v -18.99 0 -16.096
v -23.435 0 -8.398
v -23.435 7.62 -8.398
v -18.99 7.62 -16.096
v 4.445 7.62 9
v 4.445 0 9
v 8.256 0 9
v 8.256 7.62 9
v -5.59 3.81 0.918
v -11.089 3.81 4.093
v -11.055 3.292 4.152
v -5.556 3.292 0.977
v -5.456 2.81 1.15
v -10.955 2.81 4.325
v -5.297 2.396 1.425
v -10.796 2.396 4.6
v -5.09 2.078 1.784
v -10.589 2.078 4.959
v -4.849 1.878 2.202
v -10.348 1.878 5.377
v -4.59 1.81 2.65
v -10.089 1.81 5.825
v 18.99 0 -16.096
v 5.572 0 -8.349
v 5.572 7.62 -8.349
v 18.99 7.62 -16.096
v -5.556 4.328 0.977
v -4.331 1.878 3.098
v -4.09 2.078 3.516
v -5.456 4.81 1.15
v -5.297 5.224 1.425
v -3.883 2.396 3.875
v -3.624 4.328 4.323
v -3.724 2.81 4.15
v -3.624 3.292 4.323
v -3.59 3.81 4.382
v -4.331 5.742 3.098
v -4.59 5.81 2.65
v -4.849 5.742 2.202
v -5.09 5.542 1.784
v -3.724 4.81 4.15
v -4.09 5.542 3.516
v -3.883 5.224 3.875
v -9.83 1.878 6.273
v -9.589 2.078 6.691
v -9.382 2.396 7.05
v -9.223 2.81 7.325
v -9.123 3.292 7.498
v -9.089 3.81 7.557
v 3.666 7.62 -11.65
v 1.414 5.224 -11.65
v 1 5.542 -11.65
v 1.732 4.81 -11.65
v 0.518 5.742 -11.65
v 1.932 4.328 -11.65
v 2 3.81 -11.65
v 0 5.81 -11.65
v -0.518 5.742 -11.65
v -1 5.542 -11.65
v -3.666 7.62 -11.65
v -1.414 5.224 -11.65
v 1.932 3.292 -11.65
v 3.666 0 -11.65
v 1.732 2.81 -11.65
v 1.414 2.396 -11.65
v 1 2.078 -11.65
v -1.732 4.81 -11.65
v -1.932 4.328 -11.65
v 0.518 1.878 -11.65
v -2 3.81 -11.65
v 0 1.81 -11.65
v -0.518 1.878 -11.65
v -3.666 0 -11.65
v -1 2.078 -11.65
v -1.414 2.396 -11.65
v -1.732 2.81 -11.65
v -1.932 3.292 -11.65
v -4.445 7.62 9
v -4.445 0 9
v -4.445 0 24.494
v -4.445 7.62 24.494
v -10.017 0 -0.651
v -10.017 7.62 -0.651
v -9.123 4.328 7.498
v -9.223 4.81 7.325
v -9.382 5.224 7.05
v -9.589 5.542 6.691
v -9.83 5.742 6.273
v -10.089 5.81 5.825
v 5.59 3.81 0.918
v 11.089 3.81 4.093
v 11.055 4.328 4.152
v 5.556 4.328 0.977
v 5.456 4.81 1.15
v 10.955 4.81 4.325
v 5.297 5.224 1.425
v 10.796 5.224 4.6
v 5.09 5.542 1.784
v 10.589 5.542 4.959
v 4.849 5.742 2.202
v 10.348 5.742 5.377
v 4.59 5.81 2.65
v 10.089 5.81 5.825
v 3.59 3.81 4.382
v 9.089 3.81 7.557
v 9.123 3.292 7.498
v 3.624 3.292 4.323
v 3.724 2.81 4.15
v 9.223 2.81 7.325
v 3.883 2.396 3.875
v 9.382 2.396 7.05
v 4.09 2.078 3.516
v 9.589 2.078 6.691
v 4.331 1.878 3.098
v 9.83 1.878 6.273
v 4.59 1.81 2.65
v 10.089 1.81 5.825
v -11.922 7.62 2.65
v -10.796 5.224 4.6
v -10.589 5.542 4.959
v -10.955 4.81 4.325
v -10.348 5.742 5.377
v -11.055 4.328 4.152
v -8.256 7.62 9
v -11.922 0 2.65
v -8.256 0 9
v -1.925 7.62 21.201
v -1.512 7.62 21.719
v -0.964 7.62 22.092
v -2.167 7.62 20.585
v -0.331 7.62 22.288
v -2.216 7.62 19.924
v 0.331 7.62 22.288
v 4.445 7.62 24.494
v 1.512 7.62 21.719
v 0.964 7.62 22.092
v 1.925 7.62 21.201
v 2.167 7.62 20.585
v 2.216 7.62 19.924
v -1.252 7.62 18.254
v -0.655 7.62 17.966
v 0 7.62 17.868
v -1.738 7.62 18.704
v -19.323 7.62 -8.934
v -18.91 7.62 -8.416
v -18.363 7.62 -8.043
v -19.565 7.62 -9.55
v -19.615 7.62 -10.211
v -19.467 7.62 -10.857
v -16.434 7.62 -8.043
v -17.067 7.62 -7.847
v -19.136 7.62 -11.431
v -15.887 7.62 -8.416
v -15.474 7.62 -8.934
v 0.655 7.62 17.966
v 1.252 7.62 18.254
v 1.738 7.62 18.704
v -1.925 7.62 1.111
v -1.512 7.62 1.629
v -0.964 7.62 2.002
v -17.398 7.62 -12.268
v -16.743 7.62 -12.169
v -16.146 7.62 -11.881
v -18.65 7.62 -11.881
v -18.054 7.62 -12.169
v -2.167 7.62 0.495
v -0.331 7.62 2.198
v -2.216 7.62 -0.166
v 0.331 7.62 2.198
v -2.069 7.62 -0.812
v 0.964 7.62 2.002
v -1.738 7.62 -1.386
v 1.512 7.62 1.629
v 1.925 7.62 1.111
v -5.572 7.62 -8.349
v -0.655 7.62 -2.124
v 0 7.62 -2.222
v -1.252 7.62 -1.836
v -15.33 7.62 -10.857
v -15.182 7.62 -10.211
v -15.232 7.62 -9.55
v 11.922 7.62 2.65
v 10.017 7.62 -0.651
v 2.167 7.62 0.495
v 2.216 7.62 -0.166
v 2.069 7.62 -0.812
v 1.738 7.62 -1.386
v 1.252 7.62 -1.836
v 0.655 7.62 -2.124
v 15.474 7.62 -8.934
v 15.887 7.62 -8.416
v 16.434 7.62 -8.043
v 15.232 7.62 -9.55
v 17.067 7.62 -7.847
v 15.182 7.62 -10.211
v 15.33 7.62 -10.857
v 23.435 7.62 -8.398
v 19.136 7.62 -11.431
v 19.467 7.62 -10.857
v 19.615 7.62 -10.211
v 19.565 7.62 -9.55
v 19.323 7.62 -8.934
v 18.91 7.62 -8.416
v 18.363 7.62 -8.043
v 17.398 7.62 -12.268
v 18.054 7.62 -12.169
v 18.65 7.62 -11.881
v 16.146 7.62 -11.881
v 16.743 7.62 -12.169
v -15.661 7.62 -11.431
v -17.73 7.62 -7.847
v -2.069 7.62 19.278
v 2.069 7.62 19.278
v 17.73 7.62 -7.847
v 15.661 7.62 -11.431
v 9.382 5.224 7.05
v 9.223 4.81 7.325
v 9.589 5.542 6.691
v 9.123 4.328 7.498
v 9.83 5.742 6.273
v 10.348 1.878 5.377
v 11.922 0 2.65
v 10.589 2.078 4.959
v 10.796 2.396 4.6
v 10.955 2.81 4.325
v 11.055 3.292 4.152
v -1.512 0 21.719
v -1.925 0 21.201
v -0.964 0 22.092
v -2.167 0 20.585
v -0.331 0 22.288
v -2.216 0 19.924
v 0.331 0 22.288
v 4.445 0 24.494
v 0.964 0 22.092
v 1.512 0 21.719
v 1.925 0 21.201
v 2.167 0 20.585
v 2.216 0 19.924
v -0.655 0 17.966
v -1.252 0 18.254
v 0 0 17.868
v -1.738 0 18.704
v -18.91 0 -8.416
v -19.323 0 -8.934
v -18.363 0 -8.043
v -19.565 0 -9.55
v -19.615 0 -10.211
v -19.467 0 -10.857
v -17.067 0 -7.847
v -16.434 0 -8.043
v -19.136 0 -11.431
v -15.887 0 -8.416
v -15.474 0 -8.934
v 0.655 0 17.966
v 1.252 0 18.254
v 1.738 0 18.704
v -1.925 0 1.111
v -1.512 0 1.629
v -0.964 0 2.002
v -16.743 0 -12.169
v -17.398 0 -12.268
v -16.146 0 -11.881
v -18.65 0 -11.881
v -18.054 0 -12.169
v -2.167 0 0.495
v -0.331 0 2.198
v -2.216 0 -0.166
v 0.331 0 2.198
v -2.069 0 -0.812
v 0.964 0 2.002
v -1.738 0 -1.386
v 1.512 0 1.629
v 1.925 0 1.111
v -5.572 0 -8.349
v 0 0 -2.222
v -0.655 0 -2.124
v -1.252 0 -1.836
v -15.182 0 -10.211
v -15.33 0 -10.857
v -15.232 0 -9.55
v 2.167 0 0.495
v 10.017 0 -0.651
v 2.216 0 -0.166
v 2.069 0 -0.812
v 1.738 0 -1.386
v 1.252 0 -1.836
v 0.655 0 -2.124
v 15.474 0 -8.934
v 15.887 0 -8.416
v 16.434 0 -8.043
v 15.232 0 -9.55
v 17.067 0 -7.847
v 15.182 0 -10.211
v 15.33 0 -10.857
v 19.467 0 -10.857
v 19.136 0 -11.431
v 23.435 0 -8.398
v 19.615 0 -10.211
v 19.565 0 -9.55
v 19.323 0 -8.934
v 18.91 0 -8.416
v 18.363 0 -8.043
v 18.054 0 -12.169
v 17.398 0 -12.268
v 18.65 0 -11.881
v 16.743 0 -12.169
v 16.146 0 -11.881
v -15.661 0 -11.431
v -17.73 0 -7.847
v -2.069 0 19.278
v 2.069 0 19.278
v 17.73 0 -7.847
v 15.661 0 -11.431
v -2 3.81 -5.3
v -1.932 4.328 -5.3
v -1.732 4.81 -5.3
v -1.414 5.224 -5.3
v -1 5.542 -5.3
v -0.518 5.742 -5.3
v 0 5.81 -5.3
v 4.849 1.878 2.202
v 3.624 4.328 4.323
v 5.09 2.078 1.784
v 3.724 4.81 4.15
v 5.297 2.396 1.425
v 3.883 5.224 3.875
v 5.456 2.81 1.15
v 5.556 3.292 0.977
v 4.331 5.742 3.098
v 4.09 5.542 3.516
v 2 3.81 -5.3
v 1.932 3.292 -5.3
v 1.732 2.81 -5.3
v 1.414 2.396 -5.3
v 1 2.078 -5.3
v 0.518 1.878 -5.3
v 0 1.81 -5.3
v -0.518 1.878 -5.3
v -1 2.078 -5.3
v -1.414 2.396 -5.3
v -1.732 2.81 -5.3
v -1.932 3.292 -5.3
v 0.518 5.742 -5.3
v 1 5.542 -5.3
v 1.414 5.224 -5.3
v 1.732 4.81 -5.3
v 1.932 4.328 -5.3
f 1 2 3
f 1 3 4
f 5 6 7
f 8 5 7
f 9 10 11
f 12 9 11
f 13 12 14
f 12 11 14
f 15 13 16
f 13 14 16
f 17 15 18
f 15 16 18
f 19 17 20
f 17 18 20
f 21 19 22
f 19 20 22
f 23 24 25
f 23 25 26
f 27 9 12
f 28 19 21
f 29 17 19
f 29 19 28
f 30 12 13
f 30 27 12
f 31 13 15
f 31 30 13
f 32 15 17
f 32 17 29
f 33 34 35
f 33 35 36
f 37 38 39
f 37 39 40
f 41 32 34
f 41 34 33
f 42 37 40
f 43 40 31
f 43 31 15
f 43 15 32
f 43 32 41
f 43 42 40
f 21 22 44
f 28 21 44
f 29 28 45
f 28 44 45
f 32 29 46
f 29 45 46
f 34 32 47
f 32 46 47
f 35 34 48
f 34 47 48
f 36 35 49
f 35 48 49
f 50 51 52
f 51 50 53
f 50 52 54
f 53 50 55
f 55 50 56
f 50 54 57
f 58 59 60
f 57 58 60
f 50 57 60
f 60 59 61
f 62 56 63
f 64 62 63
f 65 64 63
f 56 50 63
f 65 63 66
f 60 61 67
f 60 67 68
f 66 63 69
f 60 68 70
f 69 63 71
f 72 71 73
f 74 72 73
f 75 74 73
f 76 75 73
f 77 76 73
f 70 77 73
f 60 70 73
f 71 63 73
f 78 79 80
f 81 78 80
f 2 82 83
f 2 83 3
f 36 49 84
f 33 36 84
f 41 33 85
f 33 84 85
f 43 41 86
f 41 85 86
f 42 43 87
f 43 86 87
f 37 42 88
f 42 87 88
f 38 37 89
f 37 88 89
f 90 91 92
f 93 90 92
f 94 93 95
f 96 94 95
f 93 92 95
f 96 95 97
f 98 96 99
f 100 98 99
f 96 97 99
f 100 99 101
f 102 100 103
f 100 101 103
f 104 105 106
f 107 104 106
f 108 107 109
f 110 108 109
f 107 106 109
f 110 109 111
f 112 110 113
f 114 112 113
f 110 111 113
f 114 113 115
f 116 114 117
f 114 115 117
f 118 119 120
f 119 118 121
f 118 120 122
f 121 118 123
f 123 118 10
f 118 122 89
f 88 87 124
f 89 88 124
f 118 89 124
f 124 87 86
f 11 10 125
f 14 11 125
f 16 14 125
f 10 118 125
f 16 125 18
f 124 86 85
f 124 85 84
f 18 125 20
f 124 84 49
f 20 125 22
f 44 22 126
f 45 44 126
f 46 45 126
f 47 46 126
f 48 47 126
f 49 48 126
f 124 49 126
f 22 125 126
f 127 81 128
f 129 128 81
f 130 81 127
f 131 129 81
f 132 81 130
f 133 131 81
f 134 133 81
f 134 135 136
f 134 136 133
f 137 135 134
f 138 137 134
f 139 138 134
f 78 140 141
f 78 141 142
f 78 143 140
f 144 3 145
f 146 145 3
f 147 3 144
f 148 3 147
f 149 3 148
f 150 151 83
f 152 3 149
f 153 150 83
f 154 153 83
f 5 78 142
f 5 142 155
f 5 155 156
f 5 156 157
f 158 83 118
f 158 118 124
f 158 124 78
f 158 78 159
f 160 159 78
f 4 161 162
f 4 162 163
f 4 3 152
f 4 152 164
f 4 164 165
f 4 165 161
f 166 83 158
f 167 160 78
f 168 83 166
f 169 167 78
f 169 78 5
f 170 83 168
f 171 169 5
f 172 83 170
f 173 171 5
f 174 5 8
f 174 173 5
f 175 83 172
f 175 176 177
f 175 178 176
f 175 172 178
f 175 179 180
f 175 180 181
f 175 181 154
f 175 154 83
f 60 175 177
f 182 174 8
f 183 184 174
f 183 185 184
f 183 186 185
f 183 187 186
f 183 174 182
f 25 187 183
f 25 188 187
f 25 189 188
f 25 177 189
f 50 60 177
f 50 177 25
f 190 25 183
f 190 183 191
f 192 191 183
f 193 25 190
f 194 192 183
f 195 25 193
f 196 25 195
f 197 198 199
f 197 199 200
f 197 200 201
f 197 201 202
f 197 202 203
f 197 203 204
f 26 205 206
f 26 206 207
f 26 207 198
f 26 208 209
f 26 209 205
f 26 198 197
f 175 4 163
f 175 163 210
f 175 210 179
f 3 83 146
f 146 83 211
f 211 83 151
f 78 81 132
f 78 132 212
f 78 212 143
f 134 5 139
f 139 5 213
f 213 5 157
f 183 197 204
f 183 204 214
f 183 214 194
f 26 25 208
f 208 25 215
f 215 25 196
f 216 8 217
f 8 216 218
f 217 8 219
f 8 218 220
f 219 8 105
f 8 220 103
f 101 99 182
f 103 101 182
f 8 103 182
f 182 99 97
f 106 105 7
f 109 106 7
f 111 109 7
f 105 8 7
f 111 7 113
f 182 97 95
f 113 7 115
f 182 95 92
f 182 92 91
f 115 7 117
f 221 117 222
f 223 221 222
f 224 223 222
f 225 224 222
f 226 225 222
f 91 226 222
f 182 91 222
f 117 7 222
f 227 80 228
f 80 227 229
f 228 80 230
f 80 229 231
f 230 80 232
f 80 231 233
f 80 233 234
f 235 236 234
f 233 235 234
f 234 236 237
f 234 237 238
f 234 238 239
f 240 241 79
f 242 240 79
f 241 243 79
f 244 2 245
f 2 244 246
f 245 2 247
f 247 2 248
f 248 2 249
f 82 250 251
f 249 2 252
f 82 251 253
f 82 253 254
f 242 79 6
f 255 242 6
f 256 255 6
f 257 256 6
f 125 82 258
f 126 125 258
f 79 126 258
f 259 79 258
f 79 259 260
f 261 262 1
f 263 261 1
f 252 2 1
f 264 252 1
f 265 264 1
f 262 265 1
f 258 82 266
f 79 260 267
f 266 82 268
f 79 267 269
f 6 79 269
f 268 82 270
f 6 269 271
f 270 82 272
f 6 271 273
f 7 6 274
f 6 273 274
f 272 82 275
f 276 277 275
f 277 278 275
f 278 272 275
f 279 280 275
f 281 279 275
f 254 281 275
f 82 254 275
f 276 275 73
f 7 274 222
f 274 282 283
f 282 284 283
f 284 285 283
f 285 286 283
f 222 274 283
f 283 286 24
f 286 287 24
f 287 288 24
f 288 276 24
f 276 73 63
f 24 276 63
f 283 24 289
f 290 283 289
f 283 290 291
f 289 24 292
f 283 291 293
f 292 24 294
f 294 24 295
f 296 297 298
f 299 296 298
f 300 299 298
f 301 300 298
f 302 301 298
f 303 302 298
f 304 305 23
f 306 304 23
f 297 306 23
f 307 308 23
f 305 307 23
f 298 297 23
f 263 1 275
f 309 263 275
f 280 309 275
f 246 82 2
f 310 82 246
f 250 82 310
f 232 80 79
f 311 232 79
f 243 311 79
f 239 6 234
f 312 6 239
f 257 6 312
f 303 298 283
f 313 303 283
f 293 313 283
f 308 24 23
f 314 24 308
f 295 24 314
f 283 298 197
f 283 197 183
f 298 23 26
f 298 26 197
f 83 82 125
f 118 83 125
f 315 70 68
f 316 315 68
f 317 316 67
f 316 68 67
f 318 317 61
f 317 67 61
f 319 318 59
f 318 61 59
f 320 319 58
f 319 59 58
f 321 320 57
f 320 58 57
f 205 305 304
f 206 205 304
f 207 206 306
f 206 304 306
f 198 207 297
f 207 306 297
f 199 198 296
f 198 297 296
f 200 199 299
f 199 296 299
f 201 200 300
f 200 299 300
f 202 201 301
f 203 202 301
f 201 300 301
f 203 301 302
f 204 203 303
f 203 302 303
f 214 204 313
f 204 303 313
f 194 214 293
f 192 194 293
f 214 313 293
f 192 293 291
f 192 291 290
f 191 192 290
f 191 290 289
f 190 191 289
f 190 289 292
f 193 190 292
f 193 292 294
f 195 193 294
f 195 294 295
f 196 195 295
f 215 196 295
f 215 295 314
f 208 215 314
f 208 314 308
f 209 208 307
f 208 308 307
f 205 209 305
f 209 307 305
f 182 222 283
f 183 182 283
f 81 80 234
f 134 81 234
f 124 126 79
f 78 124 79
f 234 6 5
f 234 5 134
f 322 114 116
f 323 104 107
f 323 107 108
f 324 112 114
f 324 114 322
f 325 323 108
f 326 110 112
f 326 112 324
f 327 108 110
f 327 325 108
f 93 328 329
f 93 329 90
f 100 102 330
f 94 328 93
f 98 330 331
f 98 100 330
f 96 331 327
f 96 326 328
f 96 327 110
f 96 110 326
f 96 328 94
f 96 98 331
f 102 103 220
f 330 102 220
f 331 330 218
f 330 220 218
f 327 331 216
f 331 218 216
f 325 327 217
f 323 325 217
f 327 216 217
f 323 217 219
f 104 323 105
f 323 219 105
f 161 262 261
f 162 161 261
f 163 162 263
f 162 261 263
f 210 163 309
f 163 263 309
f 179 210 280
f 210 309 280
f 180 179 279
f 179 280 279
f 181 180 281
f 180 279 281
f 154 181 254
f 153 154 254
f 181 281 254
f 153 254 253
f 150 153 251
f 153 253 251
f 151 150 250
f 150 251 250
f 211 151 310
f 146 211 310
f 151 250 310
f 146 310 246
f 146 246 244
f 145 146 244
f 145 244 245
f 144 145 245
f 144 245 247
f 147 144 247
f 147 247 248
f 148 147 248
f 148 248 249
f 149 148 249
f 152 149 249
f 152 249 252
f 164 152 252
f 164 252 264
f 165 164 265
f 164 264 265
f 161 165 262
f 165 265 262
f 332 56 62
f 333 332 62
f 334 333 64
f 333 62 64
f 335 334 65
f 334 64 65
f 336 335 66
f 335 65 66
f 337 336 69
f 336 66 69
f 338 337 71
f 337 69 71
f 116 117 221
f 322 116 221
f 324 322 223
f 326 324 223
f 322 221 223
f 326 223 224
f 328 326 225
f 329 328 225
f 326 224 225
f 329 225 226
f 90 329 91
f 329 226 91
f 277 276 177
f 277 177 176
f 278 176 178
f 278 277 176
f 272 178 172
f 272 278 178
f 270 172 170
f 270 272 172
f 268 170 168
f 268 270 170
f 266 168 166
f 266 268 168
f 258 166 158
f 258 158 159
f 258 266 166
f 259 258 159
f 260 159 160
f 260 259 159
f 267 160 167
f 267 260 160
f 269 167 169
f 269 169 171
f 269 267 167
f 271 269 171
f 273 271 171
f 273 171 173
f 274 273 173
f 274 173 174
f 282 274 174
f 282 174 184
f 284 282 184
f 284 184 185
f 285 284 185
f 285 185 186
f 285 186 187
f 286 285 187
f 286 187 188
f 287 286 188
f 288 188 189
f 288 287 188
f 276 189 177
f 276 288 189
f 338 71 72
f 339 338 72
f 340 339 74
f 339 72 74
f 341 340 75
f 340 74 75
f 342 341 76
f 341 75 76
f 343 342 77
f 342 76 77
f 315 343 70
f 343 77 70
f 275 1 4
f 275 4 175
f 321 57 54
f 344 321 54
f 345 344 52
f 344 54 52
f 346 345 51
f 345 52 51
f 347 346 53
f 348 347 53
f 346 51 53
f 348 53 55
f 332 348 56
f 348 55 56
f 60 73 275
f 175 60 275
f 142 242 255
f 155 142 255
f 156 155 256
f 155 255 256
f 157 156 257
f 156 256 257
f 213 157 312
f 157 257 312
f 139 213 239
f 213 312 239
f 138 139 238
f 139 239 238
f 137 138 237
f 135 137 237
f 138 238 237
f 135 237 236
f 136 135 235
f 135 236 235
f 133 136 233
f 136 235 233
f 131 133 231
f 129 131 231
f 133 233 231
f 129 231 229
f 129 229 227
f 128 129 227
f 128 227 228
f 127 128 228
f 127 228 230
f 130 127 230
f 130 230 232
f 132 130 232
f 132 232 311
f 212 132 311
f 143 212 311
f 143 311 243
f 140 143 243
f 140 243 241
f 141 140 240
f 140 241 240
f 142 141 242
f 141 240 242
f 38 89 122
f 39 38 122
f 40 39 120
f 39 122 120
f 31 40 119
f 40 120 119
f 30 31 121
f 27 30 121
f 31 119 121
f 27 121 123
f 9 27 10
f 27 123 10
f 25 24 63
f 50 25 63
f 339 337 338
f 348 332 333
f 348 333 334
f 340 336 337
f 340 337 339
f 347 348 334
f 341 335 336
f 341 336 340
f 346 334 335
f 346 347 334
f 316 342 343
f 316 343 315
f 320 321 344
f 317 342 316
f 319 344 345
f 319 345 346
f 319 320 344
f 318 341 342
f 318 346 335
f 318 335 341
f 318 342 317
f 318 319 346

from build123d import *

# Parameters (mm, degrees)
SKETCH1_R           = 2.2225
BOSS_EXTRUDE2_DEPTH = 7.62
CUT_EXTRUDE1_DEPTH  = 6.35
CUT_EXTRUDE7_DEPTH  = 6.35
CUT_EXTRUDE8_DEPTH  = 6.35
SKETCH5_W           = 8.89
SKETCH5_H           = 15.494
SKETCH5_R           = 2.2225
BOSS_EXTRUDE3_DEPTH = 7.62


with BuildPart() as part:
    # Sketch1 → Boss-Extrude2 (new body)
    with BuildSketch(Plane(origin=(0, 0, 0), x_dir=(1, 0, 0), z_dir=(0, 1, 0))):
        Polygon((3.666174209, 11.65), (-3.666174209, 11.65), (-11.922283059, -2.65), (-8.256108849, -9), (8.256108849, -9), (11.922283059, -2.65), align=None)
        with Locations(Location((0, 0, 0), (0, 0, 90))):
            Circle(SKETCH1_R, mode=Mode.SUBTRACT)
    extrude(amount=BOSS_EXTRUDE2_DEPTH)

    # Sketch2 → Cut-Extrude1 (cut)
    with BuildSketch(Plane(origin=(-10.089195954, 0, 5.825), x_dir=(0.5000000000000006, 0, 0.8660254037844384), z_dir=(-0.8660254037844384, 0, 0.5000000000000006))):
        with BuildLine():
            ThreePointArc((0, 1.81), (1.414213562, 2.395786438), (2, 3.81))
            Line((2, 3.81), (0, 3.81))
            Line((0, 3.81), (0, 1.81))
        make_face()
        with BuildLine():
            Line((0, 3.81), (2, 3.81))
            ThreePointArc((2, 3.81), (1.414213562, 5.224213562), (0, 5.81))
            Line((0, 5.81), (0, 3.81))
        make_face()
        with BuildLine():
            Line((0, 1.81), (0, 3.81))
            Line((0, 3.81), (-2, 3.81))
            ThreePointArc((-2, 3.81), (-1.414213562, 2.395786438), (0, 1.81))
        make_face()
        with BuildLine():
            Line((-2, 3.81), (0, 3.81))
            Line((0, 3.81), (0, 5.81))
            ThreePointArc((0, 5.81), (-1.414213562, 5.224213562), (-2, 3.81))
        make_face()
    extrude(amount=-CUT_EXTRUDE1_DEPTH, mode=Mode.SUBTRACT)

    # Sketch3 → Cut-Extrude7 (cut)
    with BuildSketch(Plane(origin=(10.089195954, 0, 5.825), x_dir=(0.49999999999999983, 0, -0.8660254037844388), z_dir=(0.8660254037844387, 0, 0.4999999999999998))):
        with BuildLine():
            ThreePointArc((2, 3.81), (1.414213562, 5.224213562), (0, 5.81))
            Line((0, 5.81), (0, 3.81))
            Line((0, 3.81), (2, 3.81))
        make_face()
        with BuildLine():
            Line((0, 3.81), (0, 5.81))
            ThreePointArc((0, 5.81), (-1.414213562, 5.224213562), (-2, 3.81))
            Line((-2, 3.81), (0, 3.81))
        make_face()
        with BuildLine():
            Line((2, 3.81), (0, 3.81))
            Line((0, 3.81), (0, 1.81))
            ThreePointArc((0, 1.81), (1.414213562, 2.395786438), (2, 3.81))
        make_face()
        with BuildLine():
            Line((0, 1.81), (0, 3.81))
            Line((0, 3.81), (-2, 3.81))
            ThreePointArc((-2, 3.81), (-1.414213562, 2.395786438), (0, 1.81))
        make_face()
    extrude(amount=-CUT_EXTRUDE7_DEPTH, mode=Mode.SUBTRACT)

    # Sketch4 → Cut-Extrude8 (cut)
    with BuildSketch(Plane(origin=(0, 0, -11.65), x_dir=(-1, 0, 0), z_dir=(0, 0, -1))):
        with BuildLine():
            ThreePointArc((2, 3.81), (1.414213562, 5.224213562), (0, 5.81))
            Line((0, 5.81), (0, 3.81))
            Line((0, 3.81), (2, 3.81))
        make_face()
        with BuildLine():
            Line((0, 3.81), (0, 5.81))
            ThreePointArc((0, 5.81), (-1.414213562, 5.224213562), (-2, 3.81))
            Line((-2, 3.81), (0, 3.81))
        make_face()
        with BuildLine():
            Line((2, 3.81), (0, 3.81))
            Line((0, 3.81), (0, 1.81))
            ThreePointArc((0, 1.81), (1.414213562, 2.395786438), (2, 3.81))
        make_face()
        with BuildLine():
            Line((0, 1.81), (0, 3.81))
            Line((0, 3.81), (-2, 3.81))
            ThreePointArc((-2, 3.81), (-1.414213562, 2.395786438), (0, 1.81))
        make_face()
    extrude(amount=-CUT_EXTRUDE8_DEPTH, mode=Mode.SUBTRACT)

    # Sketch5 → Boss-Extrude3 (add)
    # profile 1 of 3: a face of its own
    with BuildSketch(Plane.XZ):
        with Locations((0, 16.747)):
            Rectangle(SKETCH5_W, SKETCH5_H)
        with Locations(Location((0, 20.09, 0), (0, 0, 270))):
            Circle(SKETCH5_R, mode=Mode.SUBTRACT)
    # profile 2 of 3: a face of its own
    with BuildSketch(Plane.XZ):
        Polygon((-5.571728634, -8.34948292), (-10.016728634, -0.65051708), (-23.43492624, -8.39751708), (-18.98992624, -16.09648292), align=None)
        with Locations(Location((-17.398450362, -10.045, 0), (0, 0, 270))):
            Circle(SKETCH5_R, mode=Mode.SUBTRACT)
    # profile 3 of 3: a face of its own
    with BuildSketch(Plane.XZ):
        Polygon((10.016728634, -0.65051708), (5.571728634, -8.34948292), (18.98992624, -16.09648292), (23.43492624, -8.39751708), align=None)
        with Locations(Location((17.398450362, -10.045, 0), (0, 0, 270))):
            Circle(SKETCH5_R, mode=Mode.SUBTRACT)
    extrude(amount=-BOSS_EXTRUDE3_DEPTH)


solid = part.part
